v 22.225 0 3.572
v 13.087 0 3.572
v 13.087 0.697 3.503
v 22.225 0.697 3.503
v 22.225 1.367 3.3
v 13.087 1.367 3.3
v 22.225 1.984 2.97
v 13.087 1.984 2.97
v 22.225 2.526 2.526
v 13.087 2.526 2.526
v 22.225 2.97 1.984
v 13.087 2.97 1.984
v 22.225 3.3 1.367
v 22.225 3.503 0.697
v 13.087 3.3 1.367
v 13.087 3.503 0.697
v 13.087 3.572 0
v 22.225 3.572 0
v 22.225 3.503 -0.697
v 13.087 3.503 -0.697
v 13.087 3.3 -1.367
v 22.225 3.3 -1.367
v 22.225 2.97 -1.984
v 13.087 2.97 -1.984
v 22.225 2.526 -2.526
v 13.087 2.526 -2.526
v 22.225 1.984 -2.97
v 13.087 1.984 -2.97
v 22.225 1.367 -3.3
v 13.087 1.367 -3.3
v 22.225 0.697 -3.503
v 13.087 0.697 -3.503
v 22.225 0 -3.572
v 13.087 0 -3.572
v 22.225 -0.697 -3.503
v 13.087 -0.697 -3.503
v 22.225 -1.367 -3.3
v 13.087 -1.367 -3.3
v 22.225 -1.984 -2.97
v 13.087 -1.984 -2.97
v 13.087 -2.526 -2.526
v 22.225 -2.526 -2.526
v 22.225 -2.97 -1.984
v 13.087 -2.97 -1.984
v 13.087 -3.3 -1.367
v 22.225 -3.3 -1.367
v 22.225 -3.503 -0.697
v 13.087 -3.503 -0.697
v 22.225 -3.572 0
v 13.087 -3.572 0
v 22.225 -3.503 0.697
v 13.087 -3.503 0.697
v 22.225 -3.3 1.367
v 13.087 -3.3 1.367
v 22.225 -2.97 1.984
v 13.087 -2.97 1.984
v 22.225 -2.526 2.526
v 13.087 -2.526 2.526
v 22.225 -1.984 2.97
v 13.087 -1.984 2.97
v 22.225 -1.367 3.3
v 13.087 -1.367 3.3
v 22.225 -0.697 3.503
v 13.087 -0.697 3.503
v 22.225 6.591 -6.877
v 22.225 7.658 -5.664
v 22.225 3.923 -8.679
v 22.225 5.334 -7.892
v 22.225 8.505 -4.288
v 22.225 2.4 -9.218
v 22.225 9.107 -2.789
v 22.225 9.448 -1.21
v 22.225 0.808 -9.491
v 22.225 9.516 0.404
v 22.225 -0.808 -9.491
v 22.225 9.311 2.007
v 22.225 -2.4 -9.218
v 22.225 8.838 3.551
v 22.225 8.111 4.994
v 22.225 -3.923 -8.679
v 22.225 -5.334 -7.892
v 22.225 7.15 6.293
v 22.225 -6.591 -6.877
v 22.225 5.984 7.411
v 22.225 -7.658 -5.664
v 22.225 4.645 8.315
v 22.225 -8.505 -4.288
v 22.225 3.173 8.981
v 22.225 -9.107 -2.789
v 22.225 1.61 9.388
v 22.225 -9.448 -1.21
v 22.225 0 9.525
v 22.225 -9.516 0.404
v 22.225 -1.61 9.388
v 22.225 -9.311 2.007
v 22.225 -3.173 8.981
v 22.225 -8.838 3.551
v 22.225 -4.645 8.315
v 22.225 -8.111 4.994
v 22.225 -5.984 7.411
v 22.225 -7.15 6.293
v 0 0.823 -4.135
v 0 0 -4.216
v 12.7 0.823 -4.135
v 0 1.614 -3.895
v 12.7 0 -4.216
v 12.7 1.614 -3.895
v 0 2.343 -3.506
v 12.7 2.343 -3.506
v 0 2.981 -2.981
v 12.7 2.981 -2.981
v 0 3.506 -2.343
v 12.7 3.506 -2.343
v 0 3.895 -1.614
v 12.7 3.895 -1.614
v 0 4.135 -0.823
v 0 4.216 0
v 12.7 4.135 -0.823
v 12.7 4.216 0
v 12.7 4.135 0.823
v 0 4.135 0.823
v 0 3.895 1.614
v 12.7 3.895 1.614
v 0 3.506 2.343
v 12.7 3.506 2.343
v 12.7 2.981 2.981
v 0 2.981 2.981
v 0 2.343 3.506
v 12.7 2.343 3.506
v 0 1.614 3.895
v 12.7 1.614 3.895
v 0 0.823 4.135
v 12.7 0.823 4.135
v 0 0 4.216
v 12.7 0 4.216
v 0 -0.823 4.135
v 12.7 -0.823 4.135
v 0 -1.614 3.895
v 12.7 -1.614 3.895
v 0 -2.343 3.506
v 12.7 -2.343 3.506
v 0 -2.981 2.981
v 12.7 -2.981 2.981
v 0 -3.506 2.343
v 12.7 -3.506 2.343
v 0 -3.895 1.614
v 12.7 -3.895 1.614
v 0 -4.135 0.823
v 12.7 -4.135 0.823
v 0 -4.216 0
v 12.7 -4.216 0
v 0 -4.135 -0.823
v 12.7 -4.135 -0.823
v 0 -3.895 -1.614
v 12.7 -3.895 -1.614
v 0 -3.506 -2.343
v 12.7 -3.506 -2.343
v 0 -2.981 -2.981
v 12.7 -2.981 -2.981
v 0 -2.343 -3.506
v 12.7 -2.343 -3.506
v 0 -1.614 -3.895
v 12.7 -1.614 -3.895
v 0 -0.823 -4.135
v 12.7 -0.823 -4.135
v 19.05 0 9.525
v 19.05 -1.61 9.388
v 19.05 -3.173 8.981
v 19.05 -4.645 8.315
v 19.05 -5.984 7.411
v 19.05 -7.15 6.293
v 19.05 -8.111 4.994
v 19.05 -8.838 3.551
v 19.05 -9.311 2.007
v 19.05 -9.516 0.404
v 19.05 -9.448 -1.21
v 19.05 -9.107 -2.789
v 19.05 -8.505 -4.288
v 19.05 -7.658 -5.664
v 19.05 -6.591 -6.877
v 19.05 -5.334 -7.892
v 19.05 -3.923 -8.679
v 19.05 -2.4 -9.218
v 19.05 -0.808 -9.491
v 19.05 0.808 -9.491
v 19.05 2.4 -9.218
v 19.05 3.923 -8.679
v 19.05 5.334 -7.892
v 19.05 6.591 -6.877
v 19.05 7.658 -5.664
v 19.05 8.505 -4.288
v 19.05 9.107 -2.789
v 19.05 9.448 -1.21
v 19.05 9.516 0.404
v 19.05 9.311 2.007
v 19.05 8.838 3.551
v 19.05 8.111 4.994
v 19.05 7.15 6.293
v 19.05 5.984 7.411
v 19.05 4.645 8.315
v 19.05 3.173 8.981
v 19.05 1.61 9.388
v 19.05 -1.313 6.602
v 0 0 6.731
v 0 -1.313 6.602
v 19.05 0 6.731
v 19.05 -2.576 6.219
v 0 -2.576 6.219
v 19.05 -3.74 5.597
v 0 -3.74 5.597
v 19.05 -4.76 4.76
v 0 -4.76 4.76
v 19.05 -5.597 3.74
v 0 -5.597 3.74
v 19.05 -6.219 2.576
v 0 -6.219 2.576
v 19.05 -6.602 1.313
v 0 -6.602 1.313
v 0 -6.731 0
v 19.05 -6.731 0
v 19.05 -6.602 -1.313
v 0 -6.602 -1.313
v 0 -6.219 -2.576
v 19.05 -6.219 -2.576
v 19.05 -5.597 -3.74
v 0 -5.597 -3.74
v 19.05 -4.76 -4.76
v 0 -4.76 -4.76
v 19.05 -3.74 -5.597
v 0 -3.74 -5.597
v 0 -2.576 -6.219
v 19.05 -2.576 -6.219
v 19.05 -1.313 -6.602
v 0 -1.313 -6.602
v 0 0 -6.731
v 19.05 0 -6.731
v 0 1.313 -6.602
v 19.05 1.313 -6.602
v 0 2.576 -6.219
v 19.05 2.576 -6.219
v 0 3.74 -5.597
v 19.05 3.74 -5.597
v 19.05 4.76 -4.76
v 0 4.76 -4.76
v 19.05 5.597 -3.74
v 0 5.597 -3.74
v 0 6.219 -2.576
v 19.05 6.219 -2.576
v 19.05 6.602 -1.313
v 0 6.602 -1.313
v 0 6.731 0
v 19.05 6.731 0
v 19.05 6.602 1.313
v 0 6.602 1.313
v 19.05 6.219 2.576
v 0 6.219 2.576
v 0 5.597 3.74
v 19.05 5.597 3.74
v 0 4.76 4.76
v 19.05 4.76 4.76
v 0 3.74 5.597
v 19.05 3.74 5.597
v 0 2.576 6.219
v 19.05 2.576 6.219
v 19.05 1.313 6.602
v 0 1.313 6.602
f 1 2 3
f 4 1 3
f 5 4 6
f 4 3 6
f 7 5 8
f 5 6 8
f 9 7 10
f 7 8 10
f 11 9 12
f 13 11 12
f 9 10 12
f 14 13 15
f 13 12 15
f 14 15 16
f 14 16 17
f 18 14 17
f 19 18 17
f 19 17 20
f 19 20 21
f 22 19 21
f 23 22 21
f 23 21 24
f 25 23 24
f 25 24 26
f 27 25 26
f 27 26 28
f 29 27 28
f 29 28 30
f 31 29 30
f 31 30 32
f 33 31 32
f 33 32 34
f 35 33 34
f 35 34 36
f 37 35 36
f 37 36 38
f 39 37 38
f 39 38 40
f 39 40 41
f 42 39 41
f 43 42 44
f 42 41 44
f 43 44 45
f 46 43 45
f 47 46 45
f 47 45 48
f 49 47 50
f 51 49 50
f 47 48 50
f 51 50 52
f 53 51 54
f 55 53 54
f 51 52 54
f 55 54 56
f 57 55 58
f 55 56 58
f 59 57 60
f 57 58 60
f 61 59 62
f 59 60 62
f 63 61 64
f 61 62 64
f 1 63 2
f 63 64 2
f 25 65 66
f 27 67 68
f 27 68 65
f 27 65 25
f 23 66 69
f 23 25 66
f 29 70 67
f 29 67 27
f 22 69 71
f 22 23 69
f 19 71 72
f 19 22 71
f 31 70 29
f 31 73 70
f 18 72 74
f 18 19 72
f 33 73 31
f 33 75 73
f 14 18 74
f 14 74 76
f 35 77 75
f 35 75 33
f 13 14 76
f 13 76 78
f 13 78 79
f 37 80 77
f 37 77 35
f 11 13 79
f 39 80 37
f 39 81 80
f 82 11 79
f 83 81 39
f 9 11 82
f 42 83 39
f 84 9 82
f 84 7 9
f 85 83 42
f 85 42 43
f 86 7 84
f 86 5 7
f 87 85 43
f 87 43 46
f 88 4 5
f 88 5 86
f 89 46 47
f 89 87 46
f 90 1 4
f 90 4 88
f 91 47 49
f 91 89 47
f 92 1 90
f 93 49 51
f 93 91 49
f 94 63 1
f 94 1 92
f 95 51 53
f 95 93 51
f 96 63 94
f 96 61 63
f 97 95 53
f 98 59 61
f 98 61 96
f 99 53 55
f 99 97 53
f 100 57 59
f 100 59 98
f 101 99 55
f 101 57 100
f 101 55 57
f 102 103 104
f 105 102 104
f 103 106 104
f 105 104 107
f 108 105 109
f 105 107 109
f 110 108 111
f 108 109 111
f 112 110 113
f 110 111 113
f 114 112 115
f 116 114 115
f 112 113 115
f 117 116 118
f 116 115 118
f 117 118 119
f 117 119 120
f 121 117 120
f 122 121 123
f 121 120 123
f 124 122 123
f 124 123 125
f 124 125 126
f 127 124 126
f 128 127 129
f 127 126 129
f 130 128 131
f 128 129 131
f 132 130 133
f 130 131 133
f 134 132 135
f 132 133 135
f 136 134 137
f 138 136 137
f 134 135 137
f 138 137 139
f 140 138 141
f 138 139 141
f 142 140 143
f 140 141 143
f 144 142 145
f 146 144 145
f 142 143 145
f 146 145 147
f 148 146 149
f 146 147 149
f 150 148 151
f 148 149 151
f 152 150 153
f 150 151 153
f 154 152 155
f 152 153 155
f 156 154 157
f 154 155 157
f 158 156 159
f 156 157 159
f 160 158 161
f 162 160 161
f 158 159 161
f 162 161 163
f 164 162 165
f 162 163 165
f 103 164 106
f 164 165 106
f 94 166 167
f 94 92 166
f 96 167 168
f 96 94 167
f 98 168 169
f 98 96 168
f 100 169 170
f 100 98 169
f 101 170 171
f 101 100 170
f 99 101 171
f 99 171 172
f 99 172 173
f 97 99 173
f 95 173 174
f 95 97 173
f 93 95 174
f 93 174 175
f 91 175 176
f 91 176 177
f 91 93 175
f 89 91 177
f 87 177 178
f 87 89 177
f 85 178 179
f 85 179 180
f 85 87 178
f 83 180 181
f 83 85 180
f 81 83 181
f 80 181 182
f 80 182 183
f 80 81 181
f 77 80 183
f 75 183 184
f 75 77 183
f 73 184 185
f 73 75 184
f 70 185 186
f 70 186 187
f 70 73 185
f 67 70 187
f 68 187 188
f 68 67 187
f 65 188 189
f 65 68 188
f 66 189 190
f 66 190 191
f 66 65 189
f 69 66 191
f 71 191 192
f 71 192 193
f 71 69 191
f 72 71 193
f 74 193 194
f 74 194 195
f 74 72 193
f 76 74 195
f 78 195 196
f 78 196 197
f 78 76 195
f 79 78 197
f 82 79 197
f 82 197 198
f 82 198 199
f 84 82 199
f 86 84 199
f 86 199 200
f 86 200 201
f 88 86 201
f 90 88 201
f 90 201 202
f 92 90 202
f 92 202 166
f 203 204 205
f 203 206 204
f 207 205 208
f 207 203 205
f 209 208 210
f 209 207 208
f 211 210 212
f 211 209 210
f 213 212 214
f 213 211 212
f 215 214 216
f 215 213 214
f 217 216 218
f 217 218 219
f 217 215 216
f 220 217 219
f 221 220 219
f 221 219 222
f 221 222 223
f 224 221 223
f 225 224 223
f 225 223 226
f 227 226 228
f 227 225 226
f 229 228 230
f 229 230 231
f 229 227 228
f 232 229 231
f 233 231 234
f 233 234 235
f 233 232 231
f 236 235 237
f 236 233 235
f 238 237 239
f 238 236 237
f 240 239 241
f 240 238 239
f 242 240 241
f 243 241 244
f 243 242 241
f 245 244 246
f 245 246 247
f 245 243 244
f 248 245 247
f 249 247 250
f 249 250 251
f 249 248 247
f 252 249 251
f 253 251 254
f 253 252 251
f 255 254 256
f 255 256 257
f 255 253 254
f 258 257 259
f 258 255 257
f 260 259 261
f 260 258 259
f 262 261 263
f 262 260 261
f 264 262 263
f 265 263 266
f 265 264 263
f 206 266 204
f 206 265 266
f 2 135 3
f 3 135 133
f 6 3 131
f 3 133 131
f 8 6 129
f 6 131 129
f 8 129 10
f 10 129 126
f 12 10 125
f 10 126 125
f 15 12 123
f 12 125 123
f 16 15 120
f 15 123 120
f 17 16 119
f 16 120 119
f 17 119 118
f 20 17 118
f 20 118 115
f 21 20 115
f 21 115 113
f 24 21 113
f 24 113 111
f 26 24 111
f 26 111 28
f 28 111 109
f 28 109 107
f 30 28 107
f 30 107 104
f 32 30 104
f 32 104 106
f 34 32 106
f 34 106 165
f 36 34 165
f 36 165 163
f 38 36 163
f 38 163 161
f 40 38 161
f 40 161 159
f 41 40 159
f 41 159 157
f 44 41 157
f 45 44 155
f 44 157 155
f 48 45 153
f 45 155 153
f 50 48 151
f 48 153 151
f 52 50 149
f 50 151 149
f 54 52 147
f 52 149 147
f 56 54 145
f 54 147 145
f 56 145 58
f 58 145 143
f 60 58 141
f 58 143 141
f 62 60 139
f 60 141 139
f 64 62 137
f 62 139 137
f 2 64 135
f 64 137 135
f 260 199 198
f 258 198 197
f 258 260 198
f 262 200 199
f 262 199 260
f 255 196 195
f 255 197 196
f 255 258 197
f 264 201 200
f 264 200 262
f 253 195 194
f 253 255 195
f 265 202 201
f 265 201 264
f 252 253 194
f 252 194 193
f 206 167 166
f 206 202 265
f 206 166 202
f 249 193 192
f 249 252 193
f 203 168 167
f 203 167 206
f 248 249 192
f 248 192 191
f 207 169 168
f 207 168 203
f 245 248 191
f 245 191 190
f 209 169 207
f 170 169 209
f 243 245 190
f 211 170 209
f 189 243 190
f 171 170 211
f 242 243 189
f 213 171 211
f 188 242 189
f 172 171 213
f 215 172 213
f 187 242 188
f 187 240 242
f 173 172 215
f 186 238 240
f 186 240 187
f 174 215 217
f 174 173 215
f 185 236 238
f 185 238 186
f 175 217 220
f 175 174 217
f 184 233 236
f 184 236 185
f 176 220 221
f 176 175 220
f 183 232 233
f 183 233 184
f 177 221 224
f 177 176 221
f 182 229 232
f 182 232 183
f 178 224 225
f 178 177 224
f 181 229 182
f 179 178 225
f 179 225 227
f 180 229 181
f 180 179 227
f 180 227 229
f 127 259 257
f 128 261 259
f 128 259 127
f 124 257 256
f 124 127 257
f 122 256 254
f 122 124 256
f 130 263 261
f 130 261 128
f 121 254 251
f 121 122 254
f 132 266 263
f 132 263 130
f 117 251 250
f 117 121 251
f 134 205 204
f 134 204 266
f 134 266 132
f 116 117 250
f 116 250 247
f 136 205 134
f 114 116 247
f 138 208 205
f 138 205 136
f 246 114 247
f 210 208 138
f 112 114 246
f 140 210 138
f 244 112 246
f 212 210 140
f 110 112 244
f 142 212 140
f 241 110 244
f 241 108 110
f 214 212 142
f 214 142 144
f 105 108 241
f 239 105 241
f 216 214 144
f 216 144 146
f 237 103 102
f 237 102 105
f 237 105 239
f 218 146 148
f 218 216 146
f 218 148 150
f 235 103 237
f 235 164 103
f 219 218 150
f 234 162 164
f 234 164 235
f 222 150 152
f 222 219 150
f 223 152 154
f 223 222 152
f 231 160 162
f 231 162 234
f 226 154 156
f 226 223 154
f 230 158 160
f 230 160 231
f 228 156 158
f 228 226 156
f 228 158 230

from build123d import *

# Parameters (mm, degrees)
F_9_32_0_28125_DIAMETER_HOLE1_D   = 7.14375
PIPE_TAP_DRILL_FOR_1_8_TAP2_D     = 8.4328
PIPE_TAP_DRILL_FOR_1_8_TAP2_DEPTH = 12.7
PIPE_TAP_DRILL_FOR_1_8_TAP2_TIP   = 2.533468714


with BuildPart() as part:
    # Sketch1 → Revolve1 (revolve)
    with BuildSketch(Plane.XY, mode=Mode.PRIVATE) as revolve1_sk:
        Polygon((0, 0), (0, 6.731), (19.05, 6.731), (19.05, 9.525), (22.225, 9.525), (22.225, 0), align=None)
    revolve(revolve1_sk.sketch.rotate(Axis((0, 0, 0), (1, 0, 0)), 90), axis=Axis((0, 0, 0), (1, 0, 0)))

    # 9/32 (0.28125) Diameter Hole1 (through all)
    with Locations(Plane(origin=(22.225, 0, 0), x_dir=(0, 0, -1), z_dir=(1, 0, 0))):
        with Locations((0, 0)):
            Hole(F_9_32_0_28125_DIAMETER_HOLE1_D / 2)

    # Pipe Tap Drill for 1/8 Tap2
    with Locations(Plane.ZY):
        with Locations((0, 0)):
            Hole(PIPE_TAP_DRILL_FOR_1_8_TAP2_D / 2, depth=PIPE_TAP_DRILL_FOR_1_8_TAP2_DEPTH)
            with Locations((0, 0, -(PIPE_TAP_DRILL_FOR_1_8_TAP2_DEPTH + PIPE_TAP_DRILL_FOR_1_8_TAP2_TIP / 2))):  # 118° drill point
                Cone(0, PIPE_TAP_DRILL_FOR_1_8_TAP2_D / 2, PIPE_TAP_DRILL_FOR_1_8_TAP2_TIP, mode=Mode.SUBTRACT)


solid = part.part
